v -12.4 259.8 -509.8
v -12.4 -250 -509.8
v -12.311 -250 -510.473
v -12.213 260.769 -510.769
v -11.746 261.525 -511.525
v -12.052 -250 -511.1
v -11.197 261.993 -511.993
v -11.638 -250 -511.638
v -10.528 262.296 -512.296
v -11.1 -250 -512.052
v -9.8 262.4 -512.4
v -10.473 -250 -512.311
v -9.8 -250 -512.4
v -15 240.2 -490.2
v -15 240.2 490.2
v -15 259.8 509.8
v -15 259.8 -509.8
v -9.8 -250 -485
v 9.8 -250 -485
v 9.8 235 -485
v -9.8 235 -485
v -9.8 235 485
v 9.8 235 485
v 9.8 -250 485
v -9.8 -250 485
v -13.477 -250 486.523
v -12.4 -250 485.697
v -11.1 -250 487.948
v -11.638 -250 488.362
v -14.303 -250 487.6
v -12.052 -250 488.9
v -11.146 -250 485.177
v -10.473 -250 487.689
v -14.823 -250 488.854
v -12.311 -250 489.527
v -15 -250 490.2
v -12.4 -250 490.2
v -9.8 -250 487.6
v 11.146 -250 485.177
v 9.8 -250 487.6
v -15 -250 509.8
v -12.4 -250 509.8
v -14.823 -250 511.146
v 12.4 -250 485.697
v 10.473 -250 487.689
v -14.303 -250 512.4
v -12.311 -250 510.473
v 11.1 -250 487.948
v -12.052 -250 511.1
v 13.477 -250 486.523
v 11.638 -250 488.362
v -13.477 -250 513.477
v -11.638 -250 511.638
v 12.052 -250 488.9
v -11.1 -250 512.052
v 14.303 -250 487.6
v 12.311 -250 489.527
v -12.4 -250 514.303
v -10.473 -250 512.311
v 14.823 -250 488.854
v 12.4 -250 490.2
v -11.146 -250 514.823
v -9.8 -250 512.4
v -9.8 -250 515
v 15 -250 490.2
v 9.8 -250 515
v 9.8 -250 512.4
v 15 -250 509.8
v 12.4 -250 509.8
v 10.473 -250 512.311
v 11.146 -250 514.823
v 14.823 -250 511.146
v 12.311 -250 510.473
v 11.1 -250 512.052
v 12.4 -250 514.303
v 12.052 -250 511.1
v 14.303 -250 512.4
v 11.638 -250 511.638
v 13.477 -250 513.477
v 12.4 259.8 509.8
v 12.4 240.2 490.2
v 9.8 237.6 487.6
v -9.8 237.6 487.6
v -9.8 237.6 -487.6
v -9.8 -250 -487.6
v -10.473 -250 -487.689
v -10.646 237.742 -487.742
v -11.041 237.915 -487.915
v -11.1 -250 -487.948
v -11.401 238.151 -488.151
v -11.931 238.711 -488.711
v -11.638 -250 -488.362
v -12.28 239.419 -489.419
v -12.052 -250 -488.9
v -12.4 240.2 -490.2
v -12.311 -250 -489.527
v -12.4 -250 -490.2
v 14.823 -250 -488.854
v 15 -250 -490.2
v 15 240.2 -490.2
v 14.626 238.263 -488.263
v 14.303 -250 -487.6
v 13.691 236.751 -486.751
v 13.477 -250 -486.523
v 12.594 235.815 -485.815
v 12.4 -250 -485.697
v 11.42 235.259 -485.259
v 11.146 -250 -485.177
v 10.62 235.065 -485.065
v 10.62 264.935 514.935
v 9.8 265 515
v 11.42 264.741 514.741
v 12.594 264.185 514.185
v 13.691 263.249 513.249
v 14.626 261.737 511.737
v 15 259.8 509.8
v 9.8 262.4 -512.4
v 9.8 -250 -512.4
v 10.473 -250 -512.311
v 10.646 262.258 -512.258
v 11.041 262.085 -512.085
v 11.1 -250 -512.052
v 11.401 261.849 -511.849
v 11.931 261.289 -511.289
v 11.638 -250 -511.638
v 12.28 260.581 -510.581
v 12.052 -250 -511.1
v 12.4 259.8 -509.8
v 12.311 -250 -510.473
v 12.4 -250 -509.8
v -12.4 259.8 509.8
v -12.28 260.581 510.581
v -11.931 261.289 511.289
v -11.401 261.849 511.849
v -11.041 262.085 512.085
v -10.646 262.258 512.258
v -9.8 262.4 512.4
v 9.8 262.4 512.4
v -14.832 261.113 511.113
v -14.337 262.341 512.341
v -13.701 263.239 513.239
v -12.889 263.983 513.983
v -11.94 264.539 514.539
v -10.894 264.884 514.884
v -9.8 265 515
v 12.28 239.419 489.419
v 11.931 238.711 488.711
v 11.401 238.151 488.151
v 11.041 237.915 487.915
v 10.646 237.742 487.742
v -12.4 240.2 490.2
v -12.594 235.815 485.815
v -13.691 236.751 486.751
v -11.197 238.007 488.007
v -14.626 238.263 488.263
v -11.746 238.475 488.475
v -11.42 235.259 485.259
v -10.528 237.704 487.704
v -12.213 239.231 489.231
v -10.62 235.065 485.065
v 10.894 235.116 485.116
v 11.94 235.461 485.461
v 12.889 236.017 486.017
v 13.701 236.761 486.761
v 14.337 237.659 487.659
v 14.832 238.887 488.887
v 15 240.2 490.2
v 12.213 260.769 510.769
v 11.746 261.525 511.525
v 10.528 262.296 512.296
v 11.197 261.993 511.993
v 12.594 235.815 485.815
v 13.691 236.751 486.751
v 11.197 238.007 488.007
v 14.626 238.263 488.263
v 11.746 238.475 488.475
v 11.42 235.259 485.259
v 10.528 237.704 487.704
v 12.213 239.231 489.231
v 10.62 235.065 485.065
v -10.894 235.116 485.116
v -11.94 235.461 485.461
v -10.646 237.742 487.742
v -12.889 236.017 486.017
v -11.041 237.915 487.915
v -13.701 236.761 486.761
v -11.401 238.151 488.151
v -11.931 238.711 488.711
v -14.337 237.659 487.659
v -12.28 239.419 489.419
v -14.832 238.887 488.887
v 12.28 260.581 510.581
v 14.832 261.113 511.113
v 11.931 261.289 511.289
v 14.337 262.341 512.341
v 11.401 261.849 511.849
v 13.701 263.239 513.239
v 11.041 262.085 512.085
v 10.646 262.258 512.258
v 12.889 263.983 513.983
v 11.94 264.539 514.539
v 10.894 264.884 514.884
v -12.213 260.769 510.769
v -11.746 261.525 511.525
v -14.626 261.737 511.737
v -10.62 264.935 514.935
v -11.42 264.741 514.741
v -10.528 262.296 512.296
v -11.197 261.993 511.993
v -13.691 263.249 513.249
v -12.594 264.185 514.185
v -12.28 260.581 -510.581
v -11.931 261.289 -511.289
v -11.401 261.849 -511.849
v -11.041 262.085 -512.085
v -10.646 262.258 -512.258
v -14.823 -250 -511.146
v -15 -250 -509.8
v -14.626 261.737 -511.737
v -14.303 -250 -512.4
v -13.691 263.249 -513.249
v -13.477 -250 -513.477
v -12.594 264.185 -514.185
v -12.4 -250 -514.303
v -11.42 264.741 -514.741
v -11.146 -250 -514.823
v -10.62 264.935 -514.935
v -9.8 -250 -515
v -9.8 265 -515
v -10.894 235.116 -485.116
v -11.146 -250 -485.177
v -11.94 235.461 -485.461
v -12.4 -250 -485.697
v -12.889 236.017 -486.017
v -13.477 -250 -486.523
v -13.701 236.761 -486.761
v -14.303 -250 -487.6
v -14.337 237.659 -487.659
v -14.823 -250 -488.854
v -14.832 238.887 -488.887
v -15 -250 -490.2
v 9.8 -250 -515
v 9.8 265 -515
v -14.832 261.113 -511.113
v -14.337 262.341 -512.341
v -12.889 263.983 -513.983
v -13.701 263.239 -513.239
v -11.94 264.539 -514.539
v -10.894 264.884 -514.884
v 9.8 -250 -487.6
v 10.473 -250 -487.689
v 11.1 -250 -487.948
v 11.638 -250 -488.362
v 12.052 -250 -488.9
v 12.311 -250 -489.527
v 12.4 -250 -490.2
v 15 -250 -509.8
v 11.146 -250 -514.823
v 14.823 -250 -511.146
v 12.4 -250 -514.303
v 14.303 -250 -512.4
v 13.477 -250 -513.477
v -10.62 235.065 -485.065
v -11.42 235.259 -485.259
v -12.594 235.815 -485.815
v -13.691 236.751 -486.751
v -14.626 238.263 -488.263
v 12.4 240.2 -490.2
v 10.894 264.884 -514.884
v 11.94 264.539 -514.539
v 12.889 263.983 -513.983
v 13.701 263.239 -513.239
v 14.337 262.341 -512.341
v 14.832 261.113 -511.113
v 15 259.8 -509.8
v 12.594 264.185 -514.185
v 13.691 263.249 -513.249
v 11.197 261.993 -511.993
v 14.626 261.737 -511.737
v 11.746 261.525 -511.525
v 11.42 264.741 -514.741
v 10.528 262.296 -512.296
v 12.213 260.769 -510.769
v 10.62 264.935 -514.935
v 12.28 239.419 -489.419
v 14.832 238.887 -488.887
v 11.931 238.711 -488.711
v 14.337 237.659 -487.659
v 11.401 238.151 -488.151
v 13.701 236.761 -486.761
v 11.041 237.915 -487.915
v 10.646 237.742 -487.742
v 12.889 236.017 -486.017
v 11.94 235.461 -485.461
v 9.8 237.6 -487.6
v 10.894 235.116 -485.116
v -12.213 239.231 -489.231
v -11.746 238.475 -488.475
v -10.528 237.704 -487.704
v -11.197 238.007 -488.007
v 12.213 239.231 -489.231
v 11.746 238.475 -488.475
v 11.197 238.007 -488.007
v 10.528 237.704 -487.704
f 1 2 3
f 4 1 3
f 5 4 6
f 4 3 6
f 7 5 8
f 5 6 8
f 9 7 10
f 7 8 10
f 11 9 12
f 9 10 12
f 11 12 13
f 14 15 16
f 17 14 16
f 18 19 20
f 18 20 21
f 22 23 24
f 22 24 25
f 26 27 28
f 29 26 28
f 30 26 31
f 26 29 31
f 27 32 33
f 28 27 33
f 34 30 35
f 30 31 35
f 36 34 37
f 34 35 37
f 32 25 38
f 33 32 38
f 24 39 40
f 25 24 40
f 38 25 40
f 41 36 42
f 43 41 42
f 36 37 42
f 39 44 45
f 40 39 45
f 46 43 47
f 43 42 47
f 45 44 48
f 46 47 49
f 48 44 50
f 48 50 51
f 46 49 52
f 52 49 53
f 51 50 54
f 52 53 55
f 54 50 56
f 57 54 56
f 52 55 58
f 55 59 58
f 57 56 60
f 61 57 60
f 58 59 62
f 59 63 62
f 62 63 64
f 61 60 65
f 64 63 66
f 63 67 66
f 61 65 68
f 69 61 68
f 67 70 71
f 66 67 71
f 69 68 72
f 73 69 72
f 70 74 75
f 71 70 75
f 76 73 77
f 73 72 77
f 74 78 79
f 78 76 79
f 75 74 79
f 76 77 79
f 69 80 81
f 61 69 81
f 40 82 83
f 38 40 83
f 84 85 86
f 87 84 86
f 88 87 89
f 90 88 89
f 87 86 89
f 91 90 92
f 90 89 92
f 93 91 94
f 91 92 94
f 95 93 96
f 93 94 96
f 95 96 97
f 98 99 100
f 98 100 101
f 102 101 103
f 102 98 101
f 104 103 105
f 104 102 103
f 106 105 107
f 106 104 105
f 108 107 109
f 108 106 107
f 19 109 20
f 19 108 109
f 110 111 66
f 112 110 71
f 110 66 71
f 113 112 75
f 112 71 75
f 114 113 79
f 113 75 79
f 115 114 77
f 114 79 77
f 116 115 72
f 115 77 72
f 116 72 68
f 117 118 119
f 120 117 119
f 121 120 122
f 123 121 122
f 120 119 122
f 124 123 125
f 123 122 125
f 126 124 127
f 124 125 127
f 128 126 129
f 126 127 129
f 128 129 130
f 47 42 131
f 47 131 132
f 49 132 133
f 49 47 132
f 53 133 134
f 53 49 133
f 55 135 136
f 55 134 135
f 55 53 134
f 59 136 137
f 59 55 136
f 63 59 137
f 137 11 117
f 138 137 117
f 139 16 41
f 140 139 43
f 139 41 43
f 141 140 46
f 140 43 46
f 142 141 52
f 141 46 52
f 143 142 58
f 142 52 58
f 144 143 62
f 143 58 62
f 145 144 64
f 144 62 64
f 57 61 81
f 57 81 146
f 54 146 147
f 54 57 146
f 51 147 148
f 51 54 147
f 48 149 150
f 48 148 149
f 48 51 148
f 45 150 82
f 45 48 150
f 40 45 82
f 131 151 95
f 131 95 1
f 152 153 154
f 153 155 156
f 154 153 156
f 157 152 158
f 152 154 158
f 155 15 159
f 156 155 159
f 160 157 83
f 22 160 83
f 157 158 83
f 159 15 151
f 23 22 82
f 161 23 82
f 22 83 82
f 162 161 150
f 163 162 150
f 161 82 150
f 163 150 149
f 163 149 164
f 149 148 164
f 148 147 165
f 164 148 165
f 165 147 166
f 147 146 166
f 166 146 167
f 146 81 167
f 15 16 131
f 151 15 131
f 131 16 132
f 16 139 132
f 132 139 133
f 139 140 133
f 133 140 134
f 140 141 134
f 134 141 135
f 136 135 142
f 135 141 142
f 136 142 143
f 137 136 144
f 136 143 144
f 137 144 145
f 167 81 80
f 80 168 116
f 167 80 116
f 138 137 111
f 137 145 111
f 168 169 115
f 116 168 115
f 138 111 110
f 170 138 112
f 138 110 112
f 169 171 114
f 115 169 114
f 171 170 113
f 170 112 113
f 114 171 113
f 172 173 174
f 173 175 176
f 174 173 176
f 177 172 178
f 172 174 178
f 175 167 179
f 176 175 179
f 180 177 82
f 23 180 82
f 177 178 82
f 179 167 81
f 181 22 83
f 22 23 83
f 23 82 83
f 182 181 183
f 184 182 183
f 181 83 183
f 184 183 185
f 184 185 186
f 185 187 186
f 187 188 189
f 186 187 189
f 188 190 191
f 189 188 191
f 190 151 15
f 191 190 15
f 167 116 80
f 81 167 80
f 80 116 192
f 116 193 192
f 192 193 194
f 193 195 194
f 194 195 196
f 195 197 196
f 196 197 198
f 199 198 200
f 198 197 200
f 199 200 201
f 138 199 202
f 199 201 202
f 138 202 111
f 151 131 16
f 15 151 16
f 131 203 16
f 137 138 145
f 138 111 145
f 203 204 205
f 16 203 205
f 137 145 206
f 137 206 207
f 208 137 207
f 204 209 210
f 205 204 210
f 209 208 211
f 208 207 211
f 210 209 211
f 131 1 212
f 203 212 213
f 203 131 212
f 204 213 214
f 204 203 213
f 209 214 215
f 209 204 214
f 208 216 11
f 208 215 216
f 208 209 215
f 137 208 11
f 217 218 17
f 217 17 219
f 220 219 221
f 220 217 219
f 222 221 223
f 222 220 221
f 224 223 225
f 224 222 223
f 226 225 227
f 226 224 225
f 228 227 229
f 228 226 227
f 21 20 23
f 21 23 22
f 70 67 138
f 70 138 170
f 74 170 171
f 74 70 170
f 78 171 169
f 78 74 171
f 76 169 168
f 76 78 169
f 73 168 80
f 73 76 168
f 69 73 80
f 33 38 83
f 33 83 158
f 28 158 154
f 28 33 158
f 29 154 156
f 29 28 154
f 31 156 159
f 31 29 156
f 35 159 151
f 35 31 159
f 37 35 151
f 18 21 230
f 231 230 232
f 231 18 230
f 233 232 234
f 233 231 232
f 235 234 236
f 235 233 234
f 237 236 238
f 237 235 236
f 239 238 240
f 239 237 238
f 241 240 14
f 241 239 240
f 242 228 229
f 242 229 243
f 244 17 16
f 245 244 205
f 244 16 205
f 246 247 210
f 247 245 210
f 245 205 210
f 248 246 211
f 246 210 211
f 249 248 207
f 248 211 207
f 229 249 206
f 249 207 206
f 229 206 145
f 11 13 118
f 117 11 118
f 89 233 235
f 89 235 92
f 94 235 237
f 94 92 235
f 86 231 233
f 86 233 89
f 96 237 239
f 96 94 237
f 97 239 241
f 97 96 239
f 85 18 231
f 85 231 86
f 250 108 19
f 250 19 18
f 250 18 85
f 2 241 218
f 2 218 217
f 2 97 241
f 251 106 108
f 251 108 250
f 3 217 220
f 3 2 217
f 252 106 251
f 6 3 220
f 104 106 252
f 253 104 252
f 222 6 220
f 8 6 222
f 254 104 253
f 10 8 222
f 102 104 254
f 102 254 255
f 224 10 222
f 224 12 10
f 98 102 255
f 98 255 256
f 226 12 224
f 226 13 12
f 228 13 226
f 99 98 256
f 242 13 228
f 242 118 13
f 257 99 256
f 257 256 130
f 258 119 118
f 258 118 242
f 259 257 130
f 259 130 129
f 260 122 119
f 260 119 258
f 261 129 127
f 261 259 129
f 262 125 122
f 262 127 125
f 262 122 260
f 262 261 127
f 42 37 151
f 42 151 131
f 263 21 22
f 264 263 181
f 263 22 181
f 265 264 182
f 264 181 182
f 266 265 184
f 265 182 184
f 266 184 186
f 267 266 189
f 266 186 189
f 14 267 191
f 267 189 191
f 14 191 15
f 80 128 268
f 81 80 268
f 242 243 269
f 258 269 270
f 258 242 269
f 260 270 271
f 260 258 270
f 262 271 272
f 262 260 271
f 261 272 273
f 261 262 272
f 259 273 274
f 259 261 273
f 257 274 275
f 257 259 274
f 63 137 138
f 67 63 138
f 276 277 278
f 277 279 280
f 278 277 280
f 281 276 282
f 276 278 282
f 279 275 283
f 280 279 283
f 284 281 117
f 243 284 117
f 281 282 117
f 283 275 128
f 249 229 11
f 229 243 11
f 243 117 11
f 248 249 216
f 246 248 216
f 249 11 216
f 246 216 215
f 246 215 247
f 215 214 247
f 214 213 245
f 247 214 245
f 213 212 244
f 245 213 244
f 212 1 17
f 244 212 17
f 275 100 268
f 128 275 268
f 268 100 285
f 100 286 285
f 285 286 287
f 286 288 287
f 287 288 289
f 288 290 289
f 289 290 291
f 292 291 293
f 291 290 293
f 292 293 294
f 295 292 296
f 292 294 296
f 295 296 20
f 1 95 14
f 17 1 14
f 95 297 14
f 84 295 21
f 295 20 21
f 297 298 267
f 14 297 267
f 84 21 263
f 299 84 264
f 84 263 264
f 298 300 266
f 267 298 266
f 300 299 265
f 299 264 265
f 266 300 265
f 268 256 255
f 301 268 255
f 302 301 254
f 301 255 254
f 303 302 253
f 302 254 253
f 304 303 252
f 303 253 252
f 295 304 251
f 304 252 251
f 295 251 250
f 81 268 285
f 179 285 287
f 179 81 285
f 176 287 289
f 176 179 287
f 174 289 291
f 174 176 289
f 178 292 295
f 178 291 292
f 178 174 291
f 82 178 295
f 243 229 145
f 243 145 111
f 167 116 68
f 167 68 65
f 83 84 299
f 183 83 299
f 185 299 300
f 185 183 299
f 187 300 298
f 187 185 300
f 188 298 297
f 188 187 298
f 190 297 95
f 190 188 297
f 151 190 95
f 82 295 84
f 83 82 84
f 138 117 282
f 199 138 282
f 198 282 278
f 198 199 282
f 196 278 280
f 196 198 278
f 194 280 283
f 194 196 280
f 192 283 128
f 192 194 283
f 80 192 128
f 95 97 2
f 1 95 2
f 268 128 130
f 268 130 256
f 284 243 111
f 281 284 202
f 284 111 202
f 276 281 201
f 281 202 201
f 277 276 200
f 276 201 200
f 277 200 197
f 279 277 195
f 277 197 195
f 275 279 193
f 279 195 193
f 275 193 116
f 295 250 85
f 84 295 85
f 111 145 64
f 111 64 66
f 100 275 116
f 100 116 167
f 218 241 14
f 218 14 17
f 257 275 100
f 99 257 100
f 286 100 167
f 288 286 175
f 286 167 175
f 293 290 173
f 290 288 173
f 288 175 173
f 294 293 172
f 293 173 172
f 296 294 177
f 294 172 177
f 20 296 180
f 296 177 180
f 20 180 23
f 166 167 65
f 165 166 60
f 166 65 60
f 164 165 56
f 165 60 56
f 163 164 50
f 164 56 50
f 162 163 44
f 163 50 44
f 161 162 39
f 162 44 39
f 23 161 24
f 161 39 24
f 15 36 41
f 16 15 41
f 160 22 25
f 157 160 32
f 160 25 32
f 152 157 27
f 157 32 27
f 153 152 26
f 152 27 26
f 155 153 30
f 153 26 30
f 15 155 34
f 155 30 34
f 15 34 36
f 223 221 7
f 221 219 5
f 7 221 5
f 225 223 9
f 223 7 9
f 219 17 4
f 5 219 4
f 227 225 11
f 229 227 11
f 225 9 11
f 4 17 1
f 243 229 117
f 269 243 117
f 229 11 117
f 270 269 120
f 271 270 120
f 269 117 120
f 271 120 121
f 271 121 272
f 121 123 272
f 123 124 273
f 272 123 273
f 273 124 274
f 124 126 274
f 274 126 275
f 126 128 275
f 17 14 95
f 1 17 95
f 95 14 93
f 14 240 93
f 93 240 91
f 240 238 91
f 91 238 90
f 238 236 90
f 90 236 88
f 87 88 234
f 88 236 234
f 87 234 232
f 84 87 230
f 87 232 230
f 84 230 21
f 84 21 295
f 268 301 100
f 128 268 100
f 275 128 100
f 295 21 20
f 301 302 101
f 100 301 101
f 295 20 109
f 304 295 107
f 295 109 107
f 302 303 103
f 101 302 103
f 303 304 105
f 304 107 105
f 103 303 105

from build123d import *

# Parameters (mm, degrees)
SQUARE_TUBE_30_X_30_X_2_6_1_DEPTH        = 522.213203436
SQUARE_TUBE_30_X_30_X_2_6_1_2_DEPTH      = 1044.426406871
SQUARE_TUBE_30_X_30_X_2_6_1_3_DEPTH      = 500
SQUARE_TUBE_30_X_30_X_2_6_1_3_DEPTH_BACK = 22.213203436


with BuildPart() as part:
    # Sketch18 on segment 1 (carried to segment 1) → Square tube 30 X 30 X 2.6(1) (new body)
    with BuildSketch(Plane(origin=(0, -250, 500), x_dir=(0, 0, 1), z_dir=(0, 1, 0))):
        with BuildLine():
            Line((-9.8, -15), (9.8, -15))
            ThreePointArc((9.8, -15), (13.476955262, -13.476955262), (15, -9.8))
            Line((15, -9.8), (15, 9.8))
            ThreePointArc((15, 9.8), (13.476955262, 13.476955262), (9.8, 15))
            Line((9.8, 15), (-9.8, 15))
            ThreePointArc((-9.8, 15), (-13.476955262, 13.476955262), (-15, 9.8))
            Line((-15, 9.8), (-15, -9.8))
            ThreePointArc((-15, -9.8), (-13.476955262, -13.476955262), (-9.8, -15))
        make_face()
        with BuildLine():
            Line((-9.8, -12.4), (9.8, -12.4))
            ThreePointArc((9.8, -12.4), (11.638477631, -11.638477631), (12.4, -9.8))
            Line((12.4, -9.8), (12.4, 9.8))
            ThreePointArc((12.4, 9.8), (11.638477631, 11.638477631), (9.8, 12.4))
            Line((9.8, 12.4), (-9.8, 12.4))
            ThreePointArc((-9.8, 12.4), (-11.638477631, 11.638477631), (-12.4, 9.8))
            Line((-12.4, 9.8), (-12.4, -9.8))
            ThreePointArc((-12.4, -9.8), (-11.638477631, -11.638477631), (-9.8, -12.4))
        make_face(mode=Mode.SUBTRACT)
    extrude(amount=SQUARE_TUBE_30_X_30_X_2_6_1_DEPTH)

    # Square tube 30 X 30 X 2.6(1) mitre 1
    split(bisect_by=Plane(origin=(0, 250, 500), x_dir=(1, 0, 0), z_dir=(0, -0.707106781, 0.707106781)), keep=Keep.TOP)


with BuildPart() as body_2:
    # Sketch18 on segment 2 (carried to segment 2) → Square tube 30 X 30 X 2.6_1 2 (new body)
    with BuildSketch(Plane(origin=(0, 250, 522.213203436), x_dir=(0, 1, 0), z_dir=(0, 0, -1))):
        with BuildLine():
            Line((-9.8, -15), (9.8, -15))
            ThreePointArc((9.8, -15), (13.476955262, -13.476955262), (15, -9.8))
            Line((15, -9.8), (15, 9.8))
            ThreePointArc((15, 9.8), (13.476955262, 13.476955262), (9.8, 15))
            Line((9.8, 15), (-9.8, 15))
            ThreePointArc((-9.8, 15), (-13.476955262, 13.476955262), (-15, 9.8))
            Line((-15, 9.8), (-15, -9.8))
            ThreePointArc((-15, -9.8), (-13.476955262, -13.476955262), (-9.8, -15))
        make_face()
        with BuildLine():
            Line((-9.8, -12.4), (9.8, -12.4))
            ThreePointArc((9.8, -12.4), (11.638477631, -11.638477631), (12.4, -9.8))
            Line((12.4, -9.8), (12.4, 9.8))
            ThreePointArc((12.4, 9.8), (11.638477631, 11.638477631), (9.8, 12.4))
            Line((9.8, 12.4), (-9.8, 12.4))
            ThreePointArc((-9.8, 12.4), (-11.638477631, 11.638477631), (-12.4, 9.8))
            Line((-12.4, 9.8), (-12.4, -9.8))
            ThreePointArc((-12.4, -9.8), (-11.638477631, -11.638477631), (-9.8, -12.4))
        make_face(mode=Mode.SUBTRACT)
    extrude(amount=SQUARE_TUBE_30_X_30_X_2_6_1_2_DEPTH)

    # Square tube 30 X 30 X 2.6_1 2 mitre 1
    split(bisect_by=Plane(origin=(0, 250, -500), x_dir=(-1, 0, 0), z_dir=(0, 0.707106781, 0.707106781)), keep=Keep.TOP)

    # Square tube 30 X 30 X 2.6_1 2 mitre 2
    split(bisect_by=Plane(origin=(0, 250, 500), x_dir=(-1, 0, 0), z_dir=(0, 0.707106781, -0.707106781)), keep=Keep.TOP)


with BuildPart() as body_3:
    # Sketch18 → Square tube 30 X 30 X 2.6_1 3 (new, two sides)
    with BuildSketch(Plane(origin=(0, 250, -500), x_dir=(0, 0, -1), z_dir=(0, -1, 0))) as square_tube_30_x_30_x_2_6_1_3_sk:
        with BuildLine():
            Line((-9.8, -15), (9.8, -15))
            ThreePointArc((9.8, -15), (13.476955262, -13.476955262), (15, -9.8))
            Line((15, -9.8), (15, 9.8))
            ThreePointArc((15, 9.8), (13.476955262, 13.476955262), (9.8, 15))
            Line((9.8, 15), (-9.8, 15))
            ThreePointArc((-9.8, 15), (-13.476955262, 13.476955262), (-15, 9.8))
            Line((-15, 9.8), (-15, -9.8))
            ThreePointArc((-15, -9.8), (-13.476955262, -13.476955262), (-9.8, -15))
        make_face()
        with BuildLine():
            Line((-9.8, -12.4), (9.8, -12.4))
            ThreePointArc((9.8, -12.4), (11.638477631, -11.638477631), (12.4, -9.8))
            Line((12.4, -9.8), (12.4, 9.8))
            ThreePointArc((12.4, 9.8), (11.638477631, 11.638477631), (9.8, 12.4))
            Line((9.8, 12.4), (-9.8, 12.4))
            ThreePointArc((-9.8, 12.4), (-11.638477631, 11.638477631), (-12.4, 9.8))
            Line((-12.4, 9.8), (-12.4, -9.8))
            ThreePointArc((-12.4, -9.8), (-11.638477631, -11.638477631), (-9.8, -12.4))
        make_face(mode=Mode.SUBTRACT)
    extrude(amount=SQUARE_TUBE_30_X_30_X_2_6_1_3_DEPTH)
    extrude(square_tube_30_x_30_x_2_6_1_3_sk.sketch, amount=-SQUARE_TUBE_30_X_30_X_2_6_1_3_DEPTH_BACK)

    # Square tube 30 X 30 X 2.6_1 3 mitre 1
    split(bisect_by=Plane(origin=(0, 250, -500), x_dir=(1, 0, 0), z_dir=(0, -0.707106781, -0.707106781)), keep=Keep.TOP)


solid = Compound([part.part, body_2.part, body_3.part])
